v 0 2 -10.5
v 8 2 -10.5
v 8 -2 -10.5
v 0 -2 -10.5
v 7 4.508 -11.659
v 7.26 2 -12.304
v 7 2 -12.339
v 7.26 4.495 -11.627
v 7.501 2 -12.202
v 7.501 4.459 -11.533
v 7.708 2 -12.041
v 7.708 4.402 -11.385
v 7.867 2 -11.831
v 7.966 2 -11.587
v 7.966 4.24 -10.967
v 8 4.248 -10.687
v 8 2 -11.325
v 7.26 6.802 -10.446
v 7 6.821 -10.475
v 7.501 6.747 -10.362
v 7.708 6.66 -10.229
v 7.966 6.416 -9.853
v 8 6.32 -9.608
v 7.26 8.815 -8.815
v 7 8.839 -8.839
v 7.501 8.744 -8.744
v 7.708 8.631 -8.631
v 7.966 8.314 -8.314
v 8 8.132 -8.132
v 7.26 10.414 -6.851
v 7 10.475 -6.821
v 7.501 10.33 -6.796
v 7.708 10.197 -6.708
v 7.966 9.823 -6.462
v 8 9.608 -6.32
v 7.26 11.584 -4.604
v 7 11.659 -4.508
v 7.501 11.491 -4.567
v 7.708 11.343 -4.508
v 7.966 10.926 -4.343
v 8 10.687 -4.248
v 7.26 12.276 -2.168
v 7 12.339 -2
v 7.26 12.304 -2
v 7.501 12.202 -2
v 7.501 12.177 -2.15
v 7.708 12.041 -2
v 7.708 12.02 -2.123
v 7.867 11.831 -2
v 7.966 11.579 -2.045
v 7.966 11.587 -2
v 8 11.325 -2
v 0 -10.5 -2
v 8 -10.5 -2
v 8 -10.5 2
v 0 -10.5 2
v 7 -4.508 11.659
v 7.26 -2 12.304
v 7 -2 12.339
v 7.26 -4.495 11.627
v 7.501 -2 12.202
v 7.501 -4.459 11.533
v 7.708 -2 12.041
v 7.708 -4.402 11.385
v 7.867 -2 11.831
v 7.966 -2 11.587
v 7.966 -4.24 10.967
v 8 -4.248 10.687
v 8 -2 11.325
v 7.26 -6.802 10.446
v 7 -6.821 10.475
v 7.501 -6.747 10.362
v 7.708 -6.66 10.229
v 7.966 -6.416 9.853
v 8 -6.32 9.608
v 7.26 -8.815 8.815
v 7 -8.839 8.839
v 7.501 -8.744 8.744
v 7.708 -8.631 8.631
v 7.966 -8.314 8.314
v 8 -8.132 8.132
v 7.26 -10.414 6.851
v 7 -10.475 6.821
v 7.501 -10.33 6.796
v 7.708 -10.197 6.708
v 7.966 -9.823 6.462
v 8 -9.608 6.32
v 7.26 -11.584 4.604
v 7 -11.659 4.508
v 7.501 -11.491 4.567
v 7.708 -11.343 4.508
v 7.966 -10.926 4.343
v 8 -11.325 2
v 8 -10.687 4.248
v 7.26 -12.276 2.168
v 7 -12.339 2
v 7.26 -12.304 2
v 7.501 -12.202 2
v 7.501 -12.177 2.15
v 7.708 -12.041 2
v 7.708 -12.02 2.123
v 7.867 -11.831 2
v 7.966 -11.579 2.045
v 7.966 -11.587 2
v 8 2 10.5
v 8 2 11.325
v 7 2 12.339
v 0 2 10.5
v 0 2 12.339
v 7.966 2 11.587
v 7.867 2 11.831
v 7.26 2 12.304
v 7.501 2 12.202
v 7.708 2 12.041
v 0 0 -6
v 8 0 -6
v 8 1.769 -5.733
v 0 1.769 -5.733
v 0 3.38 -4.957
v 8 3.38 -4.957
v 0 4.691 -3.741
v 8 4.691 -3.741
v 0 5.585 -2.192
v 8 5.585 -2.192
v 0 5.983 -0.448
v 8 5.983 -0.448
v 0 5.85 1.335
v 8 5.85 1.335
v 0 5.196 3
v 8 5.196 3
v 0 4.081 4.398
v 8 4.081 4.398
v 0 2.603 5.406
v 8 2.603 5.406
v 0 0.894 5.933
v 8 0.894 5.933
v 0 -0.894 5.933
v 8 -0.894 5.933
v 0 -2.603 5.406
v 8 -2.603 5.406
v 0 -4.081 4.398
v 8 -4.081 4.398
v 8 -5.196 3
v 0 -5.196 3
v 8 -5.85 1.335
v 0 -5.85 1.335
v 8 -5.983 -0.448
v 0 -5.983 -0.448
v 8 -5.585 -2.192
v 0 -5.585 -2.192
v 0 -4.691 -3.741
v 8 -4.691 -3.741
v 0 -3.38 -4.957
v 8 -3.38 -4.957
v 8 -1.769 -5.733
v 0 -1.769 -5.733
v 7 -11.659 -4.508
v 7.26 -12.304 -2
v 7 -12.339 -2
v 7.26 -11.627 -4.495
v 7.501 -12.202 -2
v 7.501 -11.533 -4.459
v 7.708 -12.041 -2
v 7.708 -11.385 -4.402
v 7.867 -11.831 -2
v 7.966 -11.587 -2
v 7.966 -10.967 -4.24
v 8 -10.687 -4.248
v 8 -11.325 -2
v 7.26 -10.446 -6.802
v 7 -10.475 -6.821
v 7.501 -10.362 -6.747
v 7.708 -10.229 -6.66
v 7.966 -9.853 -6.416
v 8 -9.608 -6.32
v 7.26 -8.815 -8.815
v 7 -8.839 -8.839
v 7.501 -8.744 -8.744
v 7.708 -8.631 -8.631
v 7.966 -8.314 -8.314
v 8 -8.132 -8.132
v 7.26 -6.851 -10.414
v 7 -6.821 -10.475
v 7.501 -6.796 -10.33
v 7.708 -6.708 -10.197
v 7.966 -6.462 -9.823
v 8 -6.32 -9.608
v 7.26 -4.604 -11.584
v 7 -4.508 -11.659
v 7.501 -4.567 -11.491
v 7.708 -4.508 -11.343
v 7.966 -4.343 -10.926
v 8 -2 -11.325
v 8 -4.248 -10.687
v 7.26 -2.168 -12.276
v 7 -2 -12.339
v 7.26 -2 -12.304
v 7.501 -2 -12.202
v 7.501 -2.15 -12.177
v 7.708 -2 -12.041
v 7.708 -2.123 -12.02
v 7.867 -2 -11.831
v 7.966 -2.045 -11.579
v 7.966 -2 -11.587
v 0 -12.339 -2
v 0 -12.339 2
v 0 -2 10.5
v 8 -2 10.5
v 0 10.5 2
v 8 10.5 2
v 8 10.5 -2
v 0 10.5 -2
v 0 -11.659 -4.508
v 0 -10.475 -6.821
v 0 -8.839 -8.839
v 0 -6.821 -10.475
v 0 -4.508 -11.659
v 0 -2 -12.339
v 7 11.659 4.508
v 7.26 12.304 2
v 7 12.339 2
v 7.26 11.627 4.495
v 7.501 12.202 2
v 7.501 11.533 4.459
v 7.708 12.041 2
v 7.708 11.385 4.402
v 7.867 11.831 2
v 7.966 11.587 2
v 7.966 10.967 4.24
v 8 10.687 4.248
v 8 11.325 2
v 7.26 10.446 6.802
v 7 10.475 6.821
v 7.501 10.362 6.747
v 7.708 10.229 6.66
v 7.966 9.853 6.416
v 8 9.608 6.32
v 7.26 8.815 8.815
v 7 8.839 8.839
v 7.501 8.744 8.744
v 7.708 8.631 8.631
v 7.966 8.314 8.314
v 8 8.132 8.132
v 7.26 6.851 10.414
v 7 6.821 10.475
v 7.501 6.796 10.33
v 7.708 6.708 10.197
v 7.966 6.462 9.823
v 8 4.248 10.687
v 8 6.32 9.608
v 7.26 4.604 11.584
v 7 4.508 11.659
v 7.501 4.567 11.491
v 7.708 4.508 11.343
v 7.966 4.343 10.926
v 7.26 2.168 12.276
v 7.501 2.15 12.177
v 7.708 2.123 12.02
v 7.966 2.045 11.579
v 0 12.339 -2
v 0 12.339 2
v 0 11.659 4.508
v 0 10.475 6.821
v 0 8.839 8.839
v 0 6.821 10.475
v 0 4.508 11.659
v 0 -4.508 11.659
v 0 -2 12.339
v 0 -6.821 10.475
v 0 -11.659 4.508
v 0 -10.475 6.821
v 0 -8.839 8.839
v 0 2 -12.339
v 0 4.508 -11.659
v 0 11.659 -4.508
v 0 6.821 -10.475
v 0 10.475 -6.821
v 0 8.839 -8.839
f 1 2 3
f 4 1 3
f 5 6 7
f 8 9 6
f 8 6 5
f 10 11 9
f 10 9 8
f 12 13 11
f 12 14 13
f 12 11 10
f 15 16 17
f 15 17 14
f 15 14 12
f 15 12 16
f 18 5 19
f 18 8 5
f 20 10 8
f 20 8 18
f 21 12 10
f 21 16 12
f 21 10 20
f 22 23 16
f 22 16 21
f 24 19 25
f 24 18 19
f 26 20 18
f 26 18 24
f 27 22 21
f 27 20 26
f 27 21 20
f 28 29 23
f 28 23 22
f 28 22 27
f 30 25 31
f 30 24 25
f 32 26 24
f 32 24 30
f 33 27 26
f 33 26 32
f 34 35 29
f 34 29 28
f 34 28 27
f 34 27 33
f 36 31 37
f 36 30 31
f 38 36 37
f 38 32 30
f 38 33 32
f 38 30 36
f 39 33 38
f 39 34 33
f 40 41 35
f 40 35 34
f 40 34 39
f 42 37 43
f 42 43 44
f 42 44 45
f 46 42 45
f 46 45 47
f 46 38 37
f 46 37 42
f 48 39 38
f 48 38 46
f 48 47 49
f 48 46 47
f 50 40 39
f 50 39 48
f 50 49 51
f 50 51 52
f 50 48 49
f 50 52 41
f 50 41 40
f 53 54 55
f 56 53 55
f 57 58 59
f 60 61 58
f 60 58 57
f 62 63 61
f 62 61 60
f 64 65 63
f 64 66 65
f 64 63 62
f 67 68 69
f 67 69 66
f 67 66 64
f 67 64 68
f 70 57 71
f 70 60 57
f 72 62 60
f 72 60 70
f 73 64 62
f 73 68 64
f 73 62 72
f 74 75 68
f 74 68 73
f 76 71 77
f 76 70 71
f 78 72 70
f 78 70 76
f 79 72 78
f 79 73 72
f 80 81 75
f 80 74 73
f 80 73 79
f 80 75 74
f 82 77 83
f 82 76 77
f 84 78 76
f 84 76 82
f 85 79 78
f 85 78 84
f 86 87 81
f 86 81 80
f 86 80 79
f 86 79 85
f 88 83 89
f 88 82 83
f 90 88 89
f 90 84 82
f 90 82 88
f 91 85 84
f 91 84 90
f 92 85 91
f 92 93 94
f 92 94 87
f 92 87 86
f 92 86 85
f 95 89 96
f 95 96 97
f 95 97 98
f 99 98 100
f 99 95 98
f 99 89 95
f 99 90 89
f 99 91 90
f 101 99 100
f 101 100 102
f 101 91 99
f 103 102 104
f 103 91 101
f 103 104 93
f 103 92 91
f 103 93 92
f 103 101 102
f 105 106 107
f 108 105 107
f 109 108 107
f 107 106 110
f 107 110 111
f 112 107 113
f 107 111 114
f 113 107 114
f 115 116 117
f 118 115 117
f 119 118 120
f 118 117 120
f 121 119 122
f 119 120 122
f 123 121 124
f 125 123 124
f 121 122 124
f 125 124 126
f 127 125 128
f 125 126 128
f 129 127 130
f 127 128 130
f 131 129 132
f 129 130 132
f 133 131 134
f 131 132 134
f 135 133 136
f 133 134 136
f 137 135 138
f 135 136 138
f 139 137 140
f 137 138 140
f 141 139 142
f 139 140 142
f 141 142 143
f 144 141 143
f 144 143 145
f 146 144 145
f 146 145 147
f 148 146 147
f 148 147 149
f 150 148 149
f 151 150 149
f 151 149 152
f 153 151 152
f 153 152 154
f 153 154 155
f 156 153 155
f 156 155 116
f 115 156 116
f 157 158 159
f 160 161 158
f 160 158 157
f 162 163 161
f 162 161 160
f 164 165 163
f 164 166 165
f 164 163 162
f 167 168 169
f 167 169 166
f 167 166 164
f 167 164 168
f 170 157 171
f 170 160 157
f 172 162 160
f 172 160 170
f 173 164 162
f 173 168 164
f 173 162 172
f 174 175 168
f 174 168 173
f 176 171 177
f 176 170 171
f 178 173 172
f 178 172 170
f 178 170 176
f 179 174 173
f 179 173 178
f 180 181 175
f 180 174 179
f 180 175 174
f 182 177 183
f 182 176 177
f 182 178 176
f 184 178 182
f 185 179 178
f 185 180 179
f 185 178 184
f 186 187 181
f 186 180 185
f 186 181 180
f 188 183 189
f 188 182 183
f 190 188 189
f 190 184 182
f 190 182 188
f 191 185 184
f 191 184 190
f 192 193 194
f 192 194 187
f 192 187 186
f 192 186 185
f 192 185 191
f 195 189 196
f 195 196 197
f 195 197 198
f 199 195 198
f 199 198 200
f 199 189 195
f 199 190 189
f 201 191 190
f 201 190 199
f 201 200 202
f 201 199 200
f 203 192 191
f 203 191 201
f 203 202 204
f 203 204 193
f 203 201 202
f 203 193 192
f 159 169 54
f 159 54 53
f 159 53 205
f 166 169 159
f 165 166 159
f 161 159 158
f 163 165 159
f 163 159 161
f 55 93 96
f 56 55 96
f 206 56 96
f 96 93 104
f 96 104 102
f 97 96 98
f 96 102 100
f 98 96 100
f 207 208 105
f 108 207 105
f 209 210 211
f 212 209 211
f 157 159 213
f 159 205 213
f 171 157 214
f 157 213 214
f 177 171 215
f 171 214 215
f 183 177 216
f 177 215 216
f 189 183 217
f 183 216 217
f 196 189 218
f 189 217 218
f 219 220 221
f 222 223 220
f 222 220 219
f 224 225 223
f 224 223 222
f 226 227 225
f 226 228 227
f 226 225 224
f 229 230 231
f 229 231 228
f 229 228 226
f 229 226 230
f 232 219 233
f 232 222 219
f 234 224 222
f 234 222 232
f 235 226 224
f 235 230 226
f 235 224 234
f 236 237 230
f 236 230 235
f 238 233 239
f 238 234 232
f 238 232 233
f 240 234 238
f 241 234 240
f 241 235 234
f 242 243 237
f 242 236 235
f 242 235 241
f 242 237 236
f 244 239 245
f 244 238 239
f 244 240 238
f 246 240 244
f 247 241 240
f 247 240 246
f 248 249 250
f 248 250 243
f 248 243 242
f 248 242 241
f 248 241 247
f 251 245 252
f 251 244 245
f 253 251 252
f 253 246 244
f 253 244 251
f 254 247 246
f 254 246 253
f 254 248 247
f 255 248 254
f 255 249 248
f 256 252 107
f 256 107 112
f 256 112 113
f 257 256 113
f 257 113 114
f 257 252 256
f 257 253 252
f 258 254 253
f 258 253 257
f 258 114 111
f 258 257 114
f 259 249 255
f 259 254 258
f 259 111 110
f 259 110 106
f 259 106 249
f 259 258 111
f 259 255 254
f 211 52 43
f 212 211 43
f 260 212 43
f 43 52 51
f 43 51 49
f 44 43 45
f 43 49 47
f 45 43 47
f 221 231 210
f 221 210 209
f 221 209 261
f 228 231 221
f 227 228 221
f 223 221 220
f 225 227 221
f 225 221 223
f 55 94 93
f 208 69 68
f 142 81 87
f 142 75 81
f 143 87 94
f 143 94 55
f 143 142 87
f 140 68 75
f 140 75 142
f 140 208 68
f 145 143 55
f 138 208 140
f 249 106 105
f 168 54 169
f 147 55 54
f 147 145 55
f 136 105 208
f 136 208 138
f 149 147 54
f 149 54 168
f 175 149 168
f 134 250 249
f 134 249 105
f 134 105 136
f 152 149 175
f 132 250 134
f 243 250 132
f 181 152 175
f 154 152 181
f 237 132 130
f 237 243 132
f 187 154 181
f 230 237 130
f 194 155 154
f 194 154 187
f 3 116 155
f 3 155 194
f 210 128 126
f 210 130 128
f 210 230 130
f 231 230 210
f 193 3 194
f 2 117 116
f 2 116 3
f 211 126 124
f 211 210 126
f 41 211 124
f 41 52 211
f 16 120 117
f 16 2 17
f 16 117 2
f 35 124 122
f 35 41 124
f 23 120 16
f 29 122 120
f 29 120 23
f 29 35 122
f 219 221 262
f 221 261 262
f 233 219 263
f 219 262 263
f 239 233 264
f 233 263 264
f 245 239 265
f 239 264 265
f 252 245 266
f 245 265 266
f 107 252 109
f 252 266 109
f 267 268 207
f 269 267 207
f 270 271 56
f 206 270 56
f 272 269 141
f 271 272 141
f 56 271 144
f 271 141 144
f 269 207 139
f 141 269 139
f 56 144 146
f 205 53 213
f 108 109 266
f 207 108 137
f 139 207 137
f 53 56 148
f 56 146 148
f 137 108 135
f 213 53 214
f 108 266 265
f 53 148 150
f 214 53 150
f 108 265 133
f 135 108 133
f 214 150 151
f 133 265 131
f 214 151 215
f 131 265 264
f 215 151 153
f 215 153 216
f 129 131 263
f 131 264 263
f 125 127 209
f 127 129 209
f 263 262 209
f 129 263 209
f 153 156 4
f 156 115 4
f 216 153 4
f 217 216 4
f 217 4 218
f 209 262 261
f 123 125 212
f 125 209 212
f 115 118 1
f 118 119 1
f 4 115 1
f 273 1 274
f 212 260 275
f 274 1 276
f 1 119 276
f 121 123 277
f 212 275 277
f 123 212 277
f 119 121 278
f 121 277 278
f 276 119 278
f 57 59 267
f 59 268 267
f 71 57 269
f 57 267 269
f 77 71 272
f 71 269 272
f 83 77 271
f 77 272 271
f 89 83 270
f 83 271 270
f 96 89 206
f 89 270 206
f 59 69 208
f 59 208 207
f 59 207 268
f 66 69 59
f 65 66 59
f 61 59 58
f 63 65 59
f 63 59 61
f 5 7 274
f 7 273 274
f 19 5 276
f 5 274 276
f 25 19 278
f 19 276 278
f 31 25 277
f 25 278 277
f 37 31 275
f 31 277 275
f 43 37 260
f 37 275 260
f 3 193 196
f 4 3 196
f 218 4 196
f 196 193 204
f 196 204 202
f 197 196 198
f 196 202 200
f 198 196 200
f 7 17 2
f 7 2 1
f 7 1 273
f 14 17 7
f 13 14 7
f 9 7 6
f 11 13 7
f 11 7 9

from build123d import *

# Parameters (mm, degrees)
SKETCH1_R           = 12.5
BOSS_EXTRUDE1_DEPTH = 8
SKETCH2_R           = 6
CUT_EXTRUDE1_DEPTH  = 9
FILLET1_R           = 1
SKETCH3_W           = 4
SKETCH3_H           = 4
CUT_EXTRUDE2_DEPTH  = 9
CIRPATTERN1_COUNT   = 4


with BuildPart() as part:
    # Sketch1 → Boss-Extrude1 (new body)
    with BuildSketch(Plane(origin=(0, 0, 0), x_dir=(0, 0, -1), z_dir=(1, 0, 0))):
        Circle(SKETCH1_R)
    extrude(amount=BOSS_EXTRUDE1_DEPTH)

    # Sketch2 → Cut-Extrude1 (cut, through all)
    with BuildSketch(Plane(origin=(8, 0, 0), x_dir=(0, 0, -1), z_dir=(1, 0, 0))):
        Circle(SKETCH2_R)
    extrude(amount=-CUT_EXTRUDE1_DEPTH, mode=Mode.SUBTRACT)

    # Fillet1
    fillet1_edges = [part.edges().sort_by_distance(p)[0] for p in [
        (8, 0, 12.5),
    ]]
    fillet(fillet1_edges, radius=FILLET1_R)

    # Sketch3 → Cut-Extrude2 (cut, through all)
    with BuildSketch(Plane(origin=(8, 0, 0), x_dir=(0, 0, -1), z_dir=(1, 0, 0))):
        with Locations((0, 12.5)):
            Rectangle(SKETCH3_W, SKETCH3_H)
    cut_extrude2 = extrude(amount=-CUT_EXTRUDE2_DEPTH, mode=Mode.SUBTRACT)

    # CirPattern1: Cut-Extrude2 ×4 about axis
    cirpattern1_axis = Axis((0, 0, 0), (1, 0, 0))
    for i in range(1, CIRPATTERN1_COUNT):
        add(cut_extrude2.rotate(cirpattern1_axis, i * 360 / CIRPATTERN1_COUNT), mode=Mode.SUBTRACT)


solid = part.part
